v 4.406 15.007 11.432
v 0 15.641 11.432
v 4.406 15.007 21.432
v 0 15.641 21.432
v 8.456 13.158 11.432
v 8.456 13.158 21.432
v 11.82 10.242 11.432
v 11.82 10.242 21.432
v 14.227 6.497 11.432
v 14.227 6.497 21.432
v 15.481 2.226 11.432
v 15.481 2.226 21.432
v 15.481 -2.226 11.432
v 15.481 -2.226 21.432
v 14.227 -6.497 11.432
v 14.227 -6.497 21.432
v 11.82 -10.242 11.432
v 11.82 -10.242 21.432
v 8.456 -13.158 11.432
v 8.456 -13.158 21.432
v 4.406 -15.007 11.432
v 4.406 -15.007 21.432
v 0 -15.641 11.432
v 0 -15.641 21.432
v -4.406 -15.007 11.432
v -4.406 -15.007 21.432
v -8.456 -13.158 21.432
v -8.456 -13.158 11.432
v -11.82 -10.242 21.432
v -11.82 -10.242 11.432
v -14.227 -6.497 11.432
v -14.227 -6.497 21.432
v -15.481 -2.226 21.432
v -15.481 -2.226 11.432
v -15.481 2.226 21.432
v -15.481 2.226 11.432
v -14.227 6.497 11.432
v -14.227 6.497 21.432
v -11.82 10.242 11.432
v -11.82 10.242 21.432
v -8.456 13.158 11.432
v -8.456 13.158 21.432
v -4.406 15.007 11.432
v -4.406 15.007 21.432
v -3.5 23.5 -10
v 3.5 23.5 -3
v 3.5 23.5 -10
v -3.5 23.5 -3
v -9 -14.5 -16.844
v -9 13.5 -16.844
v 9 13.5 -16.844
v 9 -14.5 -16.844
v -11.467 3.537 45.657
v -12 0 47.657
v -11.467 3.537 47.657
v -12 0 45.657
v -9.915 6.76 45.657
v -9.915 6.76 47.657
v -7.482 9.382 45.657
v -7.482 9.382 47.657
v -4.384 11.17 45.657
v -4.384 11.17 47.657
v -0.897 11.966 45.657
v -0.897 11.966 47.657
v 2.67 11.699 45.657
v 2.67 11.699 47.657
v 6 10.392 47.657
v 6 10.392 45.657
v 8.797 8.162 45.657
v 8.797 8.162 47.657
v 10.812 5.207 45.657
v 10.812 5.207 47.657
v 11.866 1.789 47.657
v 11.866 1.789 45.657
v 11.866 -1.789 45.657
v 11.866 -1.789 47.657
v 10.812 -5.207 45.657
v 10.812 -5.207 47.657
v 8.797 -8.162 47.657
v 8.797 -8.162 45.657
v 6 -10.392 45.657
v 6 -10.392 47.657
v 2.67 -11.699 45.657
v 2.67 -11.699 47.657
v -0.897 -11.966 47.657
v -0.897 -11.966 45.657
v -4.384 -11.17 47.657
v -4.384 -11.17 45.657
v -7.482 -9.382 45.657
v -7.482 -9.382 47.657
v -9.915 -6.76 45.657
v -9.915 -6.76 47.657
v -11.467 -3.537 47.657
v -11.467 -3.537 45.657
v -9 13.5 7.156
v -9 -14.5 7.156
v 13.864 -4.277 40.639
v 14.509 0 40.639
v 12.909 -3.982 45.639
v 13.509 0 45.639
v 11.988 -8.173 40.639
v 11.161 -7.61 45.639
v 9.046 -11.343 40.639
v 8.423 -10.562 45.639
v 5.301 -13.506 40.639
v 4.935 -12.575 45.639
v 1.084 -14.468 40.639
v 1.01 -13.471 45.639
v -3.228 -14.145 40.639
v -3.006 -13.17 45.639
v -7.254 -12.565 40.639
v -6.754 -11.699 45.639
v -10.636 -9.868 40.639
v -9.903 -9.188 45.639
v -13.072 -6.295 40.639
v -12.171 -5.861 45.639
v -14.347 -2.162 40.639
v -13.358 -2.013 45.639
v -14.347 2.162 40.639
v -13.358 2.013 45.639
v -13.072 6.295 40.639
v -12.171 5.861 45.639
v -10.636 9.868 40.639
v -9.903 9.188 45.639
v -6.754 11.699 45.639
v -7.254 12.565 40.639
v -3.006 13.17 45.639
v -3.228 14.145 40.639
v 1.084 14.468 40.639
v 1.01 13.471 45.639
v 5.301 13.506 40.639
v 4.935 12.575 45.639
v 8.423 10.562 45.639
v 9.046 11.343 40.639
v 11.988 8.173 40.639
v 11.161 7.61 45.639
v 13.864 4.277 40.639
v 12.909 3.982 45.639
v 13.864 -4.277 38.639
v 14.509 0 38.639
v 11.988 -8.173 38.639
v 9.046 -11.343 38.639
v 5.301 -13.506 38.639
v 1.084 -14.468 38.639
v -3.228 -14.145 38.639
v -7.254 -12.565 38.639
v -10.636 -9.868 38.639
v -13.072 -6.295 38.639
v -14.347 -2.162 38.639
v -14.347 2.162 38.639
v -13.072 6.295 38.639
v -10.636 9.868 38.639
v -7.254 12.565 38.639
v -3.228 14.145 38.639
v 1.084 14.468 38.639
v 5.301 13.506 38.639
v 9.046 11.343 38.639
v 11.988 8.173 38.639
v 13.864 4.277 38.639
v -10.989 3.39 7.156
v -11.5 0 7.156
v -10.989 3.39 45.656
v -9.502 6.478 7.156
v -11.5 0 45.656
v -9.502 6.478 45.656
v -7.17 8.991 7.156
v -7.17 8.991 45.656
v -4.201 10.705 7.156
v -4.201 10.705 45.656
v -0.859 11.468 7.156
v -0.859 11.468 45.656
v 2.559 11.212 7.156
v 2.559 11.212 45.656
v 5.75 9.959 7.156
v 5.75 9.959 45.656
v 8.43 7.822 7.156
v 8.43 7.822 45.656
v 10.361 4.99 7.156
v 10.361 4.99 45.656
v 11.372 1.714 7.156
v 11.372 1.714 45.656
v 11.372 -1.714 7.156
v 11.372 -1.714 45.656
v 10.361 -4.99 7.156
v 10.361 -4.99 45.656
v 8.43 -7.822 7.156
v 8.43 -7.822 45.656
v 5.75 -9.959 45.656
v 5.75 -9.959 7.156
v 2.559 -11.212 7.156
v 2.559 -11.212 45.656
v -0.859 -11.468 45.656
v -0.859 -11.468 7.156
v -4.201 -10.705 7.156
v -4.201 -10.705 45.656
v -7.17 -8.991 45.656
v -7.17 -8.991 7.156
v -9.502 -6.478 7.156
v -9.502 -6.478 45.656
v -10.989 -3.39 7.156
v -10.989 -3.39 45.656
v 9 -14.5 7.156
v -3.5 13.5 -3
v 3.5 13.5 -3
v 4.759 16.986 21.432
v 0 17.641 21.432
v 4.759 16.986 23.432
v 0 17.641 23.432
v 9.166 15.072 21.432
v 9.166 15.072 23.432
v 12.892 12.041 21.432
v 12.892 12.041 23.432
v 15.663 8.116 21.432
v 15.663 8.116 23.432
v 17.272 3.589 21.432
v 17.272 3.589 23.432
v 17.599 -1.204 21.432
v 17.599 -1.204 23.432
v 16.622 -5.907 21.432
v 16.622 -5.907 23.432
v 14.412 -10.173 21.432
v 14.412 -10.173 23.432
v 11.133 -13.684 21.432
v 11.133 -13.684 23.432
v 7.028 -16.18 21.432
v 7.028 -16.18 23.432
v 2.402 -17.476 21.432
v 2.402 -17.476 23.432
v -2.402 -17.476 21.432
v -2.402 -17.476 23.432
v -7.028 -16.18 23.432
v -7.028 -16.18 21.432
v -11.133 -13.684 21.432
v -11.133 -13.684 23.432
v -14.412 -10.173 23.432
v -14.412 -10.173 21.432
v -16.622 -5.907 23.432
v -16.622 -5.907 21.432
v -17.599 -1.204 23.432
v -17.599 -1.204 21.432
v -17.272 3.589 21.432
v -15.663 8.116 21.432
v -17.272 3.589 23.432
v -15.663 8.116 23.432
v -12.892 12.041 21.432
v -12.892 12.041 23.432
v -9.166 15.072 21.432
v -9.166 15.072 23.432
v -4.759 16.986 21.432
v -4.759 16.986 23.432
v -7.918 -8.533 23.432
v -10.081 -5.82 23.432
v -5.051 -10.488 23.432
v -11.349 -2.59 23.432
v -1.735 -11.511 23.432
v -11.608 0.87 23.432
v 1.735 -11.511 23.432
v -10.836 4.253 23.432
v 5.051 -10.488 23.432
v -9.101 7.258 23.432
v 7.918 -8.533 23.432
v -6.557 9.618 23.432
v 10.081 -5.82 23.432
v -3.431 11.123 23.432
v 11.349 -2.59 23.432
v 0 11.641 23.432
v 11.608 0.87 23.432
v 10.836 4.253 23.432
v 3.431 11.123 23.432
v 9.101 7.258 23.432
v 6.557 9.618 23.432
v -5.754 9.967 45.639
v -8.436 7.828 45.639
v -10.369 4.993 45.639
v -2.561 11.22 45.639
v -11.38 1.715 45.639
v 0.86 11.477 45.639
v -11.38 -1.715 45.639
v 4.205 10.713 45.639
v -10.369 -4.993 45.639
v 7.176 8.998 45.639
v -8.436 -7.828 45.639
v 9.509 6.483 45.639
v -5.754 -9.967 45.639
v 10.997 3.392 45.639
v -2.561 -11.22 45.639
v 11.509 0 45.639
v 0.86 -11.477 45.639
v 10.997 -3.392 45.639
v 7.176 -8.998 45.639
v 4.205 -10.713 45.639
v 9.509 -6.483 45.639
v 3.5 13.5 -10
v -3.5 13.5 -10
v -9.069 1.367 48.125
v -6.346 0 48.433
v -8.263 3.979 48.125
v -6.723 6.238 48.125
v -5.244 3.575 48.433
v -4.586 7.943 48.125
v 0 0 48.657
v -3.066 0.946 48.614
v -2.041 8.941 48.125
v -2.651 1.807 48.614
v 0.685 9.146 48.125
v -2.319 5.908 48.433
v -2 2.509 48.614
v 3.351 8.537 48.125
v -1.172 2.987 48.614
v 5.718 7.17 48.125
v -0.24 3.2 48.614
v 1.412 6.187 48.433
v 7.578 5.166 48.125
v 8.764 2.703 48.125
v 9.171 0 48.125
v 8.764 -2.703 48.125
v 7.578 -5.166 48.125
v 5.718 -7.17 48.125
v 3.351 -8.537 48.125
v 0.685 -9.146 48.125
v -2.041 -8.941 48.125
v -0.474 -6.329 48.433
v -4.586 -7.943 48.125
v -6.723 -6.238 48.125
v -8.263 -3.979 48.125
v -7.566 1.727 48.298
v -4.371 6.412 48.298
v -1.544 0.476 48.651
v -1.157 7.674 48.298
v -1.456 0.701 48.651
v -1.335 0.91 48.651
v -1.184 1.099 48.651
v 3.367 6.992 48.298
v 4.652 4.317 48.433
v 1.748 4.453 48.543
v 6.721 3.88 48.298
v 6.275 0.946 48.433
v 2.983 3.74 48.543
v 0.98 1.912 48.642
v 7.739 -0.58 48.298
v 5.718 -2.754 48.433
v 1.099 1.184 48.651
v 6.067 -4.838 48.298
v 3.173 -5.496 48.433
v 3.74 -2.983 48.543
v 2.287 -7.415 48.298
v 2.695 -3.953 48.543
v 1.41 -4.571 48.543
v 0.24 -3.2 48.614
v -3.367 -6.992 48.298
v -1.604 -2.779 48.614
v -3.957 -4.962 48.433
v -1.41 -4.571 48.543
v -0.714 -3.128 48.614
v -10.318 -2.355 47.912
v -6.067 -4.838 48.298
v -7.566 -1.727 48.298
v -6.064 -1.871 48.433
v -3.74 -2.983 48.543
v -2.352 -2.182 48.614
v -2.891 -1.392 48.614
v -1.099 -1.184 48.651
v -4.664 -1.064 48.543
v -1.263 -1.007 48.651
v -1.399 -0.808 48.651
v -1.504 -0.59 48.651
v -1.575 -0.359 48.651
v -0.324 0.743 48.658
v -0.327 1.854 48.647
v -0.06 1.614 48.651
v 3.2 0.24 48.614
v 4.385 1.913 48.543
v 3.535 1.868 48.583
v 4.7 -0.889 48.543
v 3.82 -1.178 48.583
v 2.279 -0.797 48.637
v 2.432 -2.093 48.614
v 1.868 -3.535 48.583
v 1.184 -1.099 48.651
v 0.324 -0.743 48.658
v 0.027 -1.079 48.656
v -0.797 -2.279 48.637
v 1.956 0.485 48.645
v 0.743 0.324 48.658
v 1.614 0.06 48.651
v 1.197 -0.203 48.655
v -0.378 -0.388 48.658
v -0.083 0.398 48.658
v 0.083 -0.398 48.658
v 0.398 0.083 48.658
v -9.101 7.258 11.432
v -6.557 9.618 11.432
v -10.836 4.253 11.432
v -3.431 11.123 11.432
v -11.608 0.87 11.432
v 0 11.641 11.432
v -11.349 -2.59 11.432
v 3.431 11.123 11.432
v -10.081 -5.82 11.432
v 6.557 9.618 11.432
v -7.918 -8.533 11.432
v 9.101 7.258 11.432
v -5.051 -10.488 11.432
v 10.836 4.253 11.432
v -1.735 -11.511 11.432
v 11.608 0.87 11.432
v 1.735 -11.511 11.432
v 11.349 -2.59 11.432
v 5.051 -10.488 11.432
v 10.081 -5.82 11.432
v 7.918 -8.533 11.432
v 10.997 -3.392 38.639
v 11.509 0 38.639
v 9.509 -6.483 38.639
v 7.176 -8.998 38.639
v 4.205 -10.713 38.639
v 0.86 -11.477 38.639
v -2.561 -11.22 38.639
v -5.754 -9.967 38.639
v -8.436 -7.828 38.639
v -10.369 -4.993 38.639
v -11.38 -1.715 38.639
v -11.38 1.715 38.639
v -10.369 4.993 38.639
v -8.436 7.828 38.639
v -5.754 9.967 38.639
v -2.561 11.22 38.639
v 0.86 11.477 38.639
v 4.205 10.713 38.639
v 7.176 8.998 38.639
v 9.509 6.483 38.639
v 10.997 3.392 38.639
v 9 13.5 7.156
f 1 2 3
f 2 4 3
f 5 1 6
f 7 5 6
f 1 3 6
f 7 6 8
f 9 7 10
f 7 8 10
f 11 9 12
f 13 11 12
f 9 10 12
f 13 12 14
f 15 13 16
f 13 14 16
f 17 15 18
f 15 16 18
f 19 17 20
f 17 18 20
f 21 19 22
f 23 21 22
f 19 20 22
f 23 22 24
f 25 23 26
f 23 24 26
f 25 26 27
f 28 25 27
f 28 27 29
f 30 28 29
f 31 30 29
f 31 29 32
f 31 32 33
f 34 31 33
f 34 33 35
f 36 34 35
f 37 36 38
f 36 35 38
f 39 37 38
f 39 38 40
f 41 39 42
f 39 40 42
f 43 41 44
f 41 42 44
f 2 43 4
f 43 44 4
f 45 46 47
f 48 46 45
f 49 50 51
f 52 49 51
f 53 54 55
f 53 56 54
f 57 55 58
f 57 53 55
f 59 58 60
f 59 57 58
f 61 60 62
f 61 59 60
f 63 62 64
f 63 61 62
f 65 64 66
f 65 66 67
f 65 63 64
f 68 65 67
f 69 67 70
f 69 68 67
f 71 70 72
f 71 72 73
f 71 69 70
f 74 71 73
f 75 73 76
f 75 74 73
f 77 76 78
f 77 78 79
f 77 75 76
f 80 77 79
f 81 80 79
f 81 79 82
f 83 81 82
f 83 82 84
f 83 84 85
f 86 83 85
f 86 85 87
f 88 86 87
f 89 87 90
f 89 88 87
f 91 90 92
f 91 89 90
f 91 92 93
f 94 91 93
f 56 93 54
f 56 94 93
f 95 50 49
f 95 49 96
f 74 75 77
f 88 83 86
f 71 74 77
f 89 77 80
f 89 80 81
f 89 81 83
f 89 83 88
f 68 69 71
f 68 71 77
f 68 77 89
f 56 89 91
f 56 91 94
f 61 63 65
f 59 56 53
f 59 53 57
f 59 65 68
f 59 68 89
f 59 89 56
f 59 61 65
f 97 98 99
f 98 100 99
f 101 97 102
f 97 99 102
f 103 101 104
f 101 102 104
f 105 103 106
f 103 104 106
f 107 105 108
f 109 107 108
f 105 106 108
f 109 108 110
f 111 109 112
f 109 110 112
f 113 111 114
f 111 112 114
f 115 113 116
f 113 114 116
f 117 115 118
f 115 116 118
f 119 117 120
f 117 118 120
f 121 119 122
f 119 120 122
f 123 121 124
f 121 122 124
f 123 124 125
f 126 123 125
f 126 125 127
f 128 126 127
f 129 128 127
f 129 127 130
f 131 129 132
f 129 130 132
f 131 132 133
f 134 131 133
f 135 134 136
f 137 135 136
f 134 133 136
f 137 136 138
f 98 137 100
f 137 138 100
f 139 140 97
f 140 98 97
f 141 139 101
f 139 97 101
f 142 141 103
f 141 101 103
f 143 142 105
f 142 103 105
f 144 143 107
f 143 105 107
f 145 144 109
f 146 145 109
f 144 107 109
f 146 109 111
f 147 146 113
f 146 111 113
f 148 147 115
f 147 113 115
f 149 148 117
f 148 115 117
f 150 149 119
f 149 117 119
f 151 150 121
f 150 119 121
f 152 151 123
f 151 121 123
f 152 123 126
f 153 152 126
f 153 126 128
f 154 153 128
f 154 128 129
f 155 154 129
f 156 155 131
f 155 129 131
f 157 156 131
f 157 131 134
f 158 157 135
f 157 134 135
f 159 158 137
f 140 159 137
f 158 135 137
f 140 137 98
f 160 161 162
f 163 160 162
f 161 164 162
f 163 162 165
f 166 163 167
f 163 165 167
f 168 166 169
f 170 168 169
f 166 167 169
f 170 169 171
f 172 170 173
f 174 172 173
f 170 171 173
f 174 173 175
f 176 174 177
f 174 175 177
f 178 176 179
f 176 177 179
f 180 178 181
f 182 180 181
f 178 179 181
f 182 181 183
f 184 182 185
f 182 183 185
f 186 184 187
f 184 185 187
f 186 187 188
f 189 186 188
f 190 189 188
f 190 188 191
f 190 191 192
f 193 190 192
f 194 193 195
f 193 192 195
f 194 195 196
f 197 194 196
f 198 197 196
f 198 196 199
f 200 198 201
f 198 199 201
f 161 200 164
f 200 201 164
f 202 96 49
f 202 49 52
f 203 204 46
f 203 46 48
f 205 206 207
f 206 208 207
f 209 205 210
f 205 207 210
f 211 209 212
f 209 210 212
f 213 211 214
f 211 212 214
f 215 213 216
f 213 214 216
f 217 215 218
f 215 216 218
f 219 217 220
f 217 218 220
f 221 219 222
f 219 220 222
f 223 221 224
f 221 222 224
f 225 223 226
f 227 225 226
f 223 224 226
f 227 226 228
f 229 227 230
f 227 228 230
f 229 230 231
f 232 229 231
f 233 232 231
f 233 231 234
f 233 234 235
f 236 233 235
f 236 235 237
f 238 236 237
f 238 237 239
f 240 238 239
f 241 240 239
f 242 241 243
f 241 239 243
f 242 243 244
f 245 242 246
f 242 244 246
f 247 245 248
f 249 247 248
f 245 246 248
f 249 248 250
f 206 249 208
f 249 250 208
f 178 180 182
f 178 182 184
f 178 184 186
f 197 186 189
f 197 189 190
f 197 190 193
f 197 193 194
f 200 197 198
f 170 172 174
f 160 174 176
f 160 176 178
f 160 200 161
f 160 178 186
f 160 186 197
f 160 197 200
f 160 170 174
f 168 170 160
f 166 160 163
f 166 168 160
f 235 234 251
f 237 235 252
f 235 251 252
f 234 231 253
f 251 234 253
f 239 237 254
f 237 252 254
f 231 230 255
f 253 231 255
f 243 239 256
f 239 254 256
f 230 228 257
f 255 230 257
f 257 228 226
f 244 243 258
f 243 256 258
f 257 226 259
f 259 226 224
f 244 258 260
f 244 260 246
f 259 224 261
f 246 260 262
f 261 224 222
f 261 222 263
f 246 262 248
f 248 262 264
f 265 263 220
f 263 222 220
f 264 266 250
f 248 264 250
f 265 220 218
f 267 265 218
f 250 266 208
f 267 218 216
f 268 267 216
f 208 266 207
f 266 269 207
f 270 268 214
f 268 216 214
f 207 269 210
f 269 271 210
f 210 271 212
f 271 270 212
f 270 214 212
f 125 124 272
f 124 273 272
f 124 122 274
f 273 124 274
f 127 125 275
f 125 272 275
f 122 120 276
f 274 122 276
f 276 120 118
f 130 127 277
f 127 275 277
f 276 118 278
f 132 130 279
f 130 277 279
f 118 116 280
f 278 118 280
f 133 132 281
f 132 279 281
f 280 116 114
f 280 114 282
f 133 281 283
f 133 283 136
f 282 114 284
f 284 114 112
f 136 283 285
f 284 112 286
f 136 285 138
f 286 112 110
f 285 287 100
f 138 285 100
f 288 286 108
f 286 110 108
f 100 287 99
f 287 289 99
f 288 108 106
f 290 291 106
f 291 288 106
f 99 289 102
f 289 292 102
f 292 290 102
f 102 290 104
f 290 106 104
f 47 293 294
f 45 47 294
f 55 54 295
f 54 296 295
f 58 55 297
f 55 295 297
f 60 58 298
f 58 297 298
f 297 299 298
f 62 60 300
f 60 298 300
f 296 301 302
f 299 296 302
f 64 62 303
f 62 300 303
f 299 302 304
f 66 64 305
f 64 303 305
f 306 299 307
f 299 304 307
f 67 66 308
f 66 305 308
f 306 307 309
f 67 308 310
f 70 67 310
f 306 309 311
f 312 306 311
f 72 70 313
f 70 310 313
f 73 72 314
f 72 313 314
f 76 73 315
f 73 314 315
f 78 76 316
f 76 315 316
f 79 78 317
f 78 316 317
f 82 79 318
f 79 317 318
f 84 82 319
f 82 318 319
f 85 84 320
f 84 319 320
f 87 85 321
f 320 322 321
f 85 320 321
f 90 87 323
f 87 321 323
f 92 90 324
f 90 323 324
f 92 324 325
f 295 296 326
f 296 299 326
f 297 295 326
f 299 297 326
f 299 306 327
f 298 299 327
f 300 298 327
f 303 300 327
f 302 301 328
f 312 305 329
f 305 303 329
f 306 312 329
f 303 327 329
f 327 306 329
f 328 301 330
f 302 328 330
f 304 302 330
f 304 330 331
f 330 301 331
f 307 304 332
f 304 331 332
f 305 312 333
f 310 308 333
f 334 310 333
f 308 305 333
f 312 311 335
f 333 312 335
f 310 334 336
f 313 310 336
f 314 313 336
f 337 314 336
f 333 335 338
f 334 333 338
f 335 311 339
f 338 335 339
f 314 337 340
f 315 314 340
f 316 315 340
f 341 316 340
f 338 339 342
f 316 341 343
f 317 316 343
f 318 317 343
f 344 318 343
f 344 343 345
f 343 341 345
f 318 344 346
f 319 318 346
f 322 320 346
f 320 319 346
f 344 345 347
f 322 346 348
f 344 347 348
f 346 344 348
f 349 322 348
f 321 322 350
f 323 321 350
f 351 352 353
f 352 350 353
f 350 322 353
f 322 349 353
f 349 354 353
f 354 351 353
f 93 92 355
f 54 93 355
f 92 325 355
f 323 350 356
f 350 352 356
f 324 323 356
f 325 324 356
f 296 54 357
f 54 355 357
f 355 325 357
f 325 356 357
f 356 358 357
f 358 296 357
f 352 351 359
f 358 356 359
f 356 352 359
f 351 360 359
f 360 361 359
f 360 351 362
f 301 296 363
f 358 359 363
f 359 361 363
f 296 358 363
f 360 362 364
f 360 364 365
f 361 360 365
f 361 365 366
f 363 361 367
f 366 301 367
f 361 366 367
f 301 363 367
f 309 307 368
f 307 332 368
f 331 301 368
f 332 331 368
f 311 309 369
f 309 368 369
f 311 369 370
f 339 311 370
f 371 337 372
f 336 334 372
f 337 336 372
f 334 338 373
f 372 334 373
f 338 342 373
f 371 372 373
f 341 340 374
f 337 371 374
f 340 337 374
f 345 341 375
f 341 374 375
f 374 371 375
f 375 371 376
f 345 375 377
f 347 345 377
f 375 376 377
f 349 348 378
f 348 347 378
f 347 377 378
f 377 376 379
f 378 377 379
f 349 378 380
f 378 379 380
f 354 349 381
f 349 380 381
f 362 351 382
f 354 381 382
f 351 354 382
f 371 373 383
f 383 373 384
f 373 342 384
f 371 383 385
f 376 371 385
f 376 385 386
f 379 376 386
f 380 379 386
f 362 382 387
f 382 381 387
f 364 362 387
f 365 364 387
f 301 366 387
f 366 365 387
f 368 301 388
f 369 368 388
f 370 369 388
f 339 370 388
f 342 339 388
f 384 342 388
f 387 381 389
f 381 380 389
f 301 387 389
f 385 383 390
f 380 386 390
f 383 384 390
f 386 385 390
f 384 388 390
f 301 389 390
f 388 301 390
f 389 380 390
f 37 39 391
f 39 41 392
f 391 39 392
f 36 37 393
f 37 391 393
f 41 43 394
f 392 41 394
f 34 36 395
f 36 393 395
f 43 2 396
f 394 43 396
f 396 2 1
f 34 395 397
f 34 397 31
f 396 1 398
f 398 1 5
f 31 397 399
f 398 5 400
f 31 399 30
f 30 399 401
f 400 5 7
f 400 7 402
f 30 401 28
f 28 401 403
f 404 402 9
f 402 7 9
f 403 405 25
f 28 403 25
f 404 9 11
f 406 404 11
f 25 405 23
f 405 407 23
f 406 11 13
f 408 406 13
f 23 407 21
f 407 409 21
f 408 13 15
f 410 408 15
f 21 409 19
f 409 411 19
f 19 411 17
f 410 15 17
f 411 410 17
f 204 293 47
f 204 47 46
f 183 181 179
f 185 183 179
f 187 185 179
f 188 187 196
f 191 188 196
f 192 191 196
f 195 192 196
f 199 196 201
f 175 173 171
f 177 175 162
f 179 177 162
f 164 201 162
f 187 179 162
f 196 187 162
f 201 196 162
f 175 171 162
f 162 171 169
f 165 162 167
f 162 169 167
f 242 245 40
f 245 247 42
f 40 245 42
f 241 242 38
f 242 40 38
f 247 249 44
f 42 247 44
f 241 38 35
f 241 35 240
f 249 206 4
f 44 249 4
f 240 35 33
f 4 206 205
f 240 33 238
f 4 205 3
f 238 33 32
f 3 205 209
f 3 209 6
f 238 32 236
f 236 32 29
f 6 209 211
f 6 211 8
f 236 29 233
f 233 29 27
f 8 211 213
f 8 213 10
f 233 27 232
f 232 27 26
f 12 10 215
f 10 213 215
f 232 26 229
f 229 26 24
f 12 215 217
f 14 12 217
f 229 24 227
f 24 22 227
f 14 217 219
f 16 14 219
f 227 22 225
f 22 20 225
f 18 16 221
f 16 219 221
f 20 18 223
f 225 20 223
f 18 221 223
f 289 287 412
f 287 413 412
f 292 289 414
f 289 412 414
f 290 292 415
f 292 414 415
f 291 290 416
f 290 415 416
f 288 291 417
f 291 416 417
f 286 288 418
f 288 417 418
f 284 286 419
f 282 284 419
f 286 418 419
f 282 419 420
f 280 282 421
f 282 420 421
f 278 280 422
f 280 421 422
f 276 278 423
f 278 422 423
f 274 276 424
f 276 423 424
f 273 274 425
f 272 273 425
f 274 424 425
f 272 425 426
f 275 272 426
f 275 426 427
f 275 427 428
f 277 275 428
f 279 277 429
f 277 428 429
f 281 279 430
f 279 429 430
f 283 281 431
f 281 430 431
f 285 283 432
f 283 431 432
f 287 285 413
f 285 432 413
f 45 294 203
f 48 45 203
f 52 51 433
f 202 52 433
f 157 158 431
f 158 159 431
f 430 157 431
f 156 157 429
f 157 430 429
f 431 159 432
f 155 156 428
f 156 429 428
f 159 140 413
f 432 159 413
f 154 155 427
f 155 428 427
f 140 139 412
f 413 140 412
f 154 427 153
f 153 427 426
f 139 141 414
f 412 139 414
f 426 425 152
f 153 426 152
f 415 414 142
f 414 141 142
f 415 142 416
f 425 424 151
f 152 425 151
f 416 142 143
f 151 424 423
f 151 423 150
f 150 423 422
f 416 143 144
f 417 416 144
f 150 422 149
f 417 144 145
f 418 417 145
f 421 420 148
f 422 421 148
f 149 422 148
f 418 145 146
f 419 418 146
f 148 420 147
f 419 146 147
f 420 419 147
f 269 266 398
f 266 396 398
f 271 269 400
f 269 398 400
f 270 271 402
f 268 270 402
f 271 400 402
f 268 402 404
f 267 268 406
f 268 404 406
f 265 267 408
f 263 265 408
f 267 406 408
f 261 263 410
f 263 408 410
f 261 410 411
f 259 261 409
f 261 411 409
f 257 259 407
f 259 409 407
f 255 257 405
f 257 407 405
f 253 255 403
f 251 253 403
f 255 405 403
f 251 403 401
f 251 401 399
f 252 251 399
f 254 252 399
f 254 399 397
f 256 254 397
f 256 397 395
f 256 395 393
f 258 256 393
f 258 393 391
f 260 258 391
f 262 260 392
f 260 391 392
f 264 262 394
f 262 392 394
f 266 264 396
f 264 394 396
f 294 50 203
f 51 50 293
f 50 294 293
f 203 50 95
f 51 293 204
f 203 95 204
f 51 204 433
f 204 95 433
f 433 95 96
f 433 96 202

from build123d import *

# Parameters (mm, degrees)
F0_W      = 11.5
F0_H      = 38.5
F6_W      = 18
F6_H      = 24
F7_DEPTH  = 28
F9_W      = 7
F9_H      = 7
F10_DEPTH = 10


with BuildPart() as f1:
    # F0 (on Front) → F1 (revolve)
    with BuildSketch(Plane.XZ):
        with Locations((-5.75, 26.40557)):
            Rectangle(F0_W, F0_H)
    revolve(axis=Axis((0, 0, 26.40557), (0, 0, -1)))


with BuildPart() as f3:
    # F2 (on Front) → F3 (revolve)
    with BuildSketch(Plane.XZ):
        Polygon((13.508729, 45.639326), (11.508729, 45.639326), (11.508729, 38.639326), (14.508729, 38.639326), (14.508729, 40.639326), align=None)
    revolve(axis=Axis((0, 0, 41.623192), (0, 0, -1)))


with BuildPart() as f5:
    # F4 (on Front) → F5 (revolve)
    with BuildSketch(Plane.XZ):
        with BuildLine():
            Line((-12, 45.657206), (0, 45.657206))
            Line((0, 45.657206), (0, 48.657206))
            add(Edge.make_bspline(
                [(-12, 47.657206), (-8.023974, 48.433267), (-4.145653, 48.678216), (0, 48.657206)],
                knots=[0, 0, 0, 0, 12.041595, 12.041595, 12.041595, 12.041595], degree=3))
            Line((-12, 47.657206), (-12, 45.657206))
        make_face()
    revolve(axis=Axis((0, 0, 47.157206), (0, 0, -1)))


with BuildPart() as f7:
    # F6 (on Front) → F7 (new body)
    with BuildSketch(Plane.XZ):
        with Locations((0, -4.84443)):
            Rectangle(F6_W, F6_H)
    extrude(amount=F7_DEPTH)


with BuildPart() as f7_1:
    # F8: moved
    add(f7.part.moved(Location((0, 13.5, 0))))

    # F9 (on face) → F10 (join)
    with BuildSketch(Plane(origin=(0, 13.5, 0), x_dir=(-1, 0, 0), z_dir=(0, 1, 0))):
        with Locations((0, -6.5)):
            Rectangle(F9_W, F9_H)
    extrude(amount=F10_DEPTH)


with BuildPart() as f12:
    # F11 (on Right) → F12 (revolve)
    with BuildSketch(Plane.YZ):
        Polygon((17.640607, 23.432437), (11.640607, 23.432437), (11.640607, 11.432437), (15.640607, 11.432437), (15.640607, 21.432437), (17.640607, 21.432437), align=None)
    revolve(axis=Axis((0, 0, 22.250649), (0, 0, -1)))


solid = Compound([f1.part, f3.part, f5.part, f7_1.part, f12.part])
